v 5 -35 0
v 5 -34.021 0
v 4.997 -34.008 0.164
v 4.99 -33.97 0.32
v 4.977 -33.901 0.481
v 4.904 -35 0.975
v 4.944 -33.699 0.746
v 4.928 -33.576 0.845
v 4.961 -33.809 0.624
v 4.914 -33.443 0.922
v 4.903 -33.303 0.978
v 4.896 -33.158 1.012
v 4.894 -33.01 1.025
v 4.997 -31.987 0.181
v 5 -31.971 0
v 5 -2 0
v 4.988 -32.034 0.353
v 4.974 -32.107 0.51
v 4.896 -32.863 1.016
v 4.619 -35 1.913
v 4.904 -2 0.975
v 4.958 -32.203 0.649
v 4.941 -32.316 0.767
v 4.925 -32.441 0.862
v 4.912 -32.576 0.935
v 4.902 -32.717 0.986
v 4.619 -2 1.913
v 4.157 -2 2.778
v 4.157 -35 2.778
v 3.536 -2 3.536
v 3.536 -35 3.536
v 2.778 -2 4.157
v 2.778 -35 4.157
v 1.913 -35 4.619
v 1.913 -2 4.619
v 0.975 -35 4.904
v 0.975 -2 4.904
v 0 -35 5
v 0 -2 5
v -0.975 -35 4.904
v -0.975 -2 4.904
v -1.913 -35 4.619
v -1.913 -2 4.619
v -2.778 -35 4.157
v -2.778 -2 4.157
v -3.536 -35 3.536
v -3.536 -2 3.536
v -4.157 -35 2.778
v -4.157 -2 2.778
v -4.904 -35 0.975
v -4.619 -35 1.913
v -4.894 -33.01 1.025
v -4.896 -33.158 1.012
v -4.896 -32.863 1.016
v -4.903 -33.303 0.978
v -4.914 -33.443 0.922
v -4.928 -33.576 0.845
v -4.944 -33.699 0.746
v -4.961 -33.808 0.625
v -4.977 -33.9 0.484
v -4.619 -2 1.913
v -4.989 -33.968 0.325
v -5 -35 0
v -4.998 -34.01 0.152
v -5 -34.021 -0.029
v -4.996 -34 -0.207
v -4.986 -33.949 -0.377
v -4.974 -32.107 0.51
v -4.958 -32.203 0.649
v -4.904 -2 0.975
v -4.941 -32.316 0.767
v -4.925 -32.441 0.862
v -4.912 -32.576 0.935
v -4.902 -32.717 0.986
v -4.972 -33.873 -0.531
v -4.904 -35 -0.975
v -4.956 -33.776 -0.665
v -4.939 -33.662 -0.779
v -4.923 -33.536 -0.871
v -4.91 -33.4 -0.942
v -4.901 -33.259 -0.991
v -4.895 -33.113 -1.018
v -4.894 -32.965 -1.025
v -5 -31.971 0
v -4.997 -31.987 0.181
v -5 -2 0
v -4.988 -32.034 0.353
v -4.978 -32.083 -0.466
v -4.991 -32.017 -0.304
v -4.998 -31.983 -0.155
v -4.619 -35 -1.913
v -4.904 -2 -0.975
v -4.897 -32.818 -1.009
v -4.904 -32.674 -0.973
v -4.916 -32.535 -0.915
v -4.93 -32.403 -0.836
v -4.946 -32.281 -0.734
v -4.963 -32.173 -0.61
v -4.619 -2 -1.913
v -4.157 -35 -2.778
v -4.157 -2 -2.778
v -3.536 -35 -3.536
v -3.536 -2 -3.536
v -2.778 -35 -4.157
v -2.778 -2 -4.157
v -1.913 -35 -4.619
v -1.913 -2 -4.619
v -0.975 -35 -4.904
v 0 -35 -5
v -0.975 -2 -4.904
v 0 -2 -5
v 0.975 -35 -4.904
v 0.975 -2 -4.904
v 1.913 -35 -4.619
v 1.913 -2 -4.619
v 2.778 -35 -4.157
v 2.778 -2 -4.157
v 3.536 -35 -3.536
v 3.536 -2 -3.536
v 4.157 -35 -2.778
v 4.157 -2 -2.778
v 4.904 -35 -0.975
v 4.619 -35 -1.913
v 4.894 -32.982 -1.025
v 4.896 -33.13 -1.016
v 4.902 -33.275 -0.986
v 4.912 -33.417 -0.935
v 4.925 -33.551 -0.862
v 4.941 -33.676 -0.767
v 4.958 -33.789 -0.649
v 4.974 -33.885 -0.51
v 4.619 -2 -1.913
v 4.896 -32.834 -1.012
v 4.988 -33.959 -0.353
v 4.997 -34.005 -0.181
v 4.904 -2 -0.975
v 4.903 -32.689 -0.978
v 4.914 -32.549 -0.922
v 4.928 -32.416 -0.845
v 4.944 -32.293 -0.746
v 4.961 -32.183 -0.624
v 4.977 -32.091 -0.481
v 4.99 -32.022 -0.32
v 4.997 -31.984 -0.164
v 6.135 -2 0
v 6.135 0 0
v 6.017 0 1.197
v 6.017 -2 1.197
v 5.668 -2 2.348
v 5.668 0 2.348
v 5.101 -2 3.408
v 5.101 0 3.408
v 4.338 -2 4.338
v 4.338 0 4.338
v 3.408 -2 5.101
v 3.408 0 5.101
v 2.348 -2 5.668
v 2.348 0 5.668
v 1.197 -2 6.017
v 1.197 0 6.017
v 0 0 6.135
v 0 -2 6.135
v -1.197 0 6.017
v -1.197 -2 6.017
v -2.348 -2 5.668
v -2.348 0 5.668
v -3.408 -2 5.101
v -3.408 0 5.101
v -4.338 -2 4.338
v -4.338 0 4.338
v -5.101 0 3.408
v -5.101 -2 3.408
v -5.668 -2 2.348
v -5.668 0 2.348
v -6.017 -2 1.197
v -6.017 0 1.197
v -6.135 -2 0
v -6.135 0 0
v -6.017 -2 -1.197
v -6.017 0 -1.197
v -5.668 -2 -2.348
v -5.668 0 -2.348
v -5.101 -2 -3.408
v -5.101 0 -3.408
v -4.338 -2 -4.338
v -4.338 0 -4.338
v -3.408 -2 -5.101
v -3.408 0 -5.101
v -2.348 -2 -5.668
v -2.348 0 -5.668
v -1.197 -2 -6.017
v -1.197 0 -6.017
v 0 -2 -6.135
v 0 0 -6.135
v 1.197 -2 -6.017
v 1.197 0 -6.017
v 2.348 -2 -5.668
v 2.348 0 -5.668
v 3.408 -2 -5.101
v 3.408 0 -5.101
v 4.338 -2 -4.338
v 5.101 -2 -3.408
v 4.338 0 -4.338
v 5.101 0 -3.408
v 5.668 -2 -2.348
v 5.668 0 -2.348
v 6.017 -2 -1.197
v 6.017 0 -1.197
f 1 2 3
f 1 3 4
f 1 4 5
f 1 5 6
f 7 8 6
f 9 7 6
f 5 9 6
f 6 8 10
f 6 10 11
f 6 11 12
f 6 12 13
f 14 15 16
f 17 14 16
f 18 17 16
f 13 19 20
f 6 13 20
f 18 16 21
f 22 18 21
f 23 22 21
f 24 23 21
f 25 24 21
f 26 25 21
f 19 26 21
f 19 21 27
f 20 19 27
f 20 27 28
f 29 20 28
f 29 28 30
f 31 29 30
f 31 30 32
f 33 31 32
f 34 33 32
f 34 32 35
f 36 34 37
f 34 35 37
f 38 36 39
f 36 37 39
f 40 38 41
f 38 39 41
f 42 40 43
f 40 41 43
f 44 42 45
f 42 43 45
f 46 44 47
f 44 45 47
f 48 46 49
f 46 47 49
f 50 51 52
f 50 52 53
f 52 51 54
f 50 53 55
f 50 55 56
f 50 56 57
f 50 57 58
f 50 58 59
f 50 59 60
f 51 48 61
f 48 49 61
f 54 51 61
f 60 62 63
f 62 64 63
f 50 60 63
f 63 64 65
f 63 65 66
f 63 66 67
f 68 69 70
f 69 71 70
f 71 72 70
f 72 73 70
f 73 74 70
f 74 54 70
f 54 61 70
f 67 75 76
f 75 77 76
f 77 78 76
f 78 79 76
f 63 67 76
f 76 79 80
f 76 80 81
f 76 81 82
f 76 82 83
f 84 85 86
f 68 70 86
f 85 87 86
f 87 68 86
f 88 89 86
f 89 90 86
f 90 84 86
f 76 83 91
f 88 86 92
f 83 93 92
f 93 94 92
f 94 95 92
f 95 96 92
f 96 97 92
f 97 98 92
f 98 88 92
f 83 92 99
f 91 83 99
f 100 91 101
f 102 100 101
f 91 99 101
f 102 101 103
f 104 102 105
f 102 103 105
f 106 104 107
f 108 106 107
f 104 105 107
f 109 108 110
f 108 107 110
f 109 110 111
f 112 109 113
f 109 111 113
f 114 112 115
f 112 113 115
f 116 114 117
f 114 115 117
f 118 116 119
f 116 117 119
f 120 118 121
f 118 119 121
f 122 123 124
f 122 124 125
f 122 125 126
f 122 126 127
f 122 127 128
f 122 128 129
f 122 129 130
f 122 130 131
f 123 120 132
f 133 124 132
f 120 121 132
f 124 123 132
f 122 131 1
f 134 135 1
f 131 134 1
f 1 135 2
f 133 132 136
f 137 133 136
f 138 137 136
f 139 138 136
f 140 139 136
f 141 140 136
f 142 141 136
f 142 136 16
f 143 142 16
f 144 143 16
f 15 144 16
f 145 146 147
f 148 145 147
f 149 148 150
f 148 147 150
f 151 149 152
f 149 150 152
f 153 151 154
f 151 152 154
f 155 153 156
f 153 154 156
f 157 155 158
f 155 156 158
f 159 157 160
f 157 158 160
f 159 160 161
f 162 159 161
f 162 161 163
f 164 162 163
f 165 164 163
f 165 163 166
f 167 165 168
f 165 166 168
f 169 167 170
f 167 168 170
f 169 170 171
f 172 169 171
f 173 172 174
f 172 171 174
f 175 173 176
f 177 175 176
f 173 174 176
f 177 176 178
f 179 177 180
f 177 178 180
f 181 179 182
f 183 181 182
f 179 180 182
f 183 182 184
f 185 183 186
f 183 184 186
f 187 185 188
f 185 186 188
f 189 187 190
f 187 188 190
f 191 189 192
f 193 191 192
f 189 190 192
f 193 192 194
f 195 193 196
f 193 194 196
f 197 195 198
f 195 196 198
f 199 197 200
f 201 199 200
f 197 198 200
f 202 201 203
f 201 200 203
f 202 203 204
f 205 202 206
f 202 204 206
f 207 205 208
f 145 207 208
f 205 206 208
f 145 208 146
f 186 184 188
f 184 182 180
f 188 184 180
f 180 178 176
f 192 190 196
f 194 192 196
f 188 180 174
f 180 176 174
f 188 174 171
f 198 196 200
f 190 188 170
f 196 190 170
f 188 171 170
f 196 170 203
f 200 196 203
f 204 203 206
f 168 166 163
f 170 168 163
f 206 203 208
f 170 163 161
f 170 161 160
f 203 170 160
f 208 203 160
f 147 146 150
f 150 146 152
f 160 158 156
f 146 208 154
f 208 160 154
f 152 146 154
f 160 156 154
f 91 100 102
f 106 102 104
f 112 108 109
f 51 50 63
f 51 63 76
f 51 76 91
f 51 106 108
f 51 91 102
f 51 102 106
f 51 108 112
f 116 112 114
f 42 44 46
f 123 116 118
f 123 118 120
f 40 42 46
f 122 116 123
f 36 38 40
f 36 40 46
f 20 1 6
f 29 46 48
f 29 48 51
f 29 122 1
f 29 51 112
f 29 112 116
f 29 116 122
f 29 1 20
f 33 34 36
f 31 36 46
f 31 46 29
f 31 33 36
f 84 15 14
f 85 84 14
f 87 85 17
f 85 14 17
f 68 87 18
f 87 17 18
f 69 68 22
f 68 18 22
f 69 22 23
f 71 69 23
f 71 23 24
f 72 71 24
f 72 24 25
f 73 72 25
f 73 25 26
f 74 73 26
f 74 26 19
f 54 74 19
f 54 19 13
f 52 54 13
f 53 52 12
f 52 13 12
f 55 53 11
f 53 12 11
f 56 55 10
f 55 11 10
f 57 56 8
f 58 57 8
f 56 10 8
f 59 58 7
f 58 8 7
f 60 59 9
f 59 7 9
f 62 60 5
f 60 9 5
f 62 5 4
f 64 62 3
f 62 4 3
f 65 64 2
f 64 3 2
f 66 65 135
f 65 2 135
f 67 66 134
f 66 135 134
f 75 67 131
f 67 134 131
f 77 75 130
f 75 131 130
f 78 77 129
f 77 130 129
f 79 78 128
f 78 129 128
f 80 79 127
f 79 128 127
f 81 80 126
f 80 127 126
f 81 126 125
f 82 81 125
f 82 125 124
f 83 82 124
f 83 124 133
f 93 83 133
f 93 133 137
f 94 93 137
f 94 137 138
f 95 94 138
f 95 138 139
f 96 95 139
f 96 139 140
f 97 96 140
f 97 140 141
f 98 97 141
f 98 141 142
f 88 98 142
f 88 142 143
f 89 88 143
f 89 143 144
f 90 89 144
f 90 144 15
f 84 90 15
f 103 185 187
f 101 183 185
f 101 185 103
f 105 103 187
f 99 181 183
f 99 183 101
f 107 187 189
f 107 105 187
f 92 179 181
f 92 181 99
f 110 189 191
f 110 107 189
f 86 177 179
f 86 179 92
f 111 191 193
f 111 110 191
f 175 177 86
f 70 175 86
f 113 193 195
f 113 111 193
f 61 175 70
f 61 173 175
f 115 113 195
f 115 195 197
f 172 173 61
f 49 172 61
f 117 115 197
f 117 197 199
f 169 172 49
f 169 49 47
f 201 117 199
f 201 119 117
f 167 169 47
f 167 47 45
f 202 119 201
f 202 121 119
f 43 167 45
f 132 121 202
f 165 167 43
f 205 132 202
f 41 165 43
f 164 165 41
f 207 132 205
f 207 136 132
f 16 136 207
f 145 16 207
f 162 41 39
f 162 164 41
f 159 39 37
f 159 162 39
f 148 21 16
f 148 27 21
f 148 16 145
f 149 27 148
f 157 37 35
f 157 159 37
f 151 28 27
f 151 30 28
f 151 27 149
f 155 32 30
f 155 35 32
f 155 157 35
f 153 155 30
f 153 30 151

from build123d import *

# Parameters (mm, degrees)
F0_R     = 6.135
F1_DEPTH = 2
F2_R     = 5
F3_DEPTH = 33
F5_R     = 1.024989
F6_DEPTH = 11.136


with BuildPart() as f1:
    # F0 (on Front) → F1 (new body)
    with BuildSketch(Plane.XZ):
        Circle(F0_R)
    extrude(amount=F1_DEPTH)

    # F2 (on face) → F3 (join)
    with BuildSketch(Plane.XZ.offset(2)):
        Circle(F2_R)
    extrude(amount=F3_DEPTH)

    # F5 (on offset) → F6 (cut, through all)
    with BuildSketch(Plane.YZ.offset(5)):
        with Locations((-32.996107, 0)):
            Circle(F5_R)
    extrude(amount=-F6_DEPTH, mode=Mode.SUBTRACT)


solid = f1.part
